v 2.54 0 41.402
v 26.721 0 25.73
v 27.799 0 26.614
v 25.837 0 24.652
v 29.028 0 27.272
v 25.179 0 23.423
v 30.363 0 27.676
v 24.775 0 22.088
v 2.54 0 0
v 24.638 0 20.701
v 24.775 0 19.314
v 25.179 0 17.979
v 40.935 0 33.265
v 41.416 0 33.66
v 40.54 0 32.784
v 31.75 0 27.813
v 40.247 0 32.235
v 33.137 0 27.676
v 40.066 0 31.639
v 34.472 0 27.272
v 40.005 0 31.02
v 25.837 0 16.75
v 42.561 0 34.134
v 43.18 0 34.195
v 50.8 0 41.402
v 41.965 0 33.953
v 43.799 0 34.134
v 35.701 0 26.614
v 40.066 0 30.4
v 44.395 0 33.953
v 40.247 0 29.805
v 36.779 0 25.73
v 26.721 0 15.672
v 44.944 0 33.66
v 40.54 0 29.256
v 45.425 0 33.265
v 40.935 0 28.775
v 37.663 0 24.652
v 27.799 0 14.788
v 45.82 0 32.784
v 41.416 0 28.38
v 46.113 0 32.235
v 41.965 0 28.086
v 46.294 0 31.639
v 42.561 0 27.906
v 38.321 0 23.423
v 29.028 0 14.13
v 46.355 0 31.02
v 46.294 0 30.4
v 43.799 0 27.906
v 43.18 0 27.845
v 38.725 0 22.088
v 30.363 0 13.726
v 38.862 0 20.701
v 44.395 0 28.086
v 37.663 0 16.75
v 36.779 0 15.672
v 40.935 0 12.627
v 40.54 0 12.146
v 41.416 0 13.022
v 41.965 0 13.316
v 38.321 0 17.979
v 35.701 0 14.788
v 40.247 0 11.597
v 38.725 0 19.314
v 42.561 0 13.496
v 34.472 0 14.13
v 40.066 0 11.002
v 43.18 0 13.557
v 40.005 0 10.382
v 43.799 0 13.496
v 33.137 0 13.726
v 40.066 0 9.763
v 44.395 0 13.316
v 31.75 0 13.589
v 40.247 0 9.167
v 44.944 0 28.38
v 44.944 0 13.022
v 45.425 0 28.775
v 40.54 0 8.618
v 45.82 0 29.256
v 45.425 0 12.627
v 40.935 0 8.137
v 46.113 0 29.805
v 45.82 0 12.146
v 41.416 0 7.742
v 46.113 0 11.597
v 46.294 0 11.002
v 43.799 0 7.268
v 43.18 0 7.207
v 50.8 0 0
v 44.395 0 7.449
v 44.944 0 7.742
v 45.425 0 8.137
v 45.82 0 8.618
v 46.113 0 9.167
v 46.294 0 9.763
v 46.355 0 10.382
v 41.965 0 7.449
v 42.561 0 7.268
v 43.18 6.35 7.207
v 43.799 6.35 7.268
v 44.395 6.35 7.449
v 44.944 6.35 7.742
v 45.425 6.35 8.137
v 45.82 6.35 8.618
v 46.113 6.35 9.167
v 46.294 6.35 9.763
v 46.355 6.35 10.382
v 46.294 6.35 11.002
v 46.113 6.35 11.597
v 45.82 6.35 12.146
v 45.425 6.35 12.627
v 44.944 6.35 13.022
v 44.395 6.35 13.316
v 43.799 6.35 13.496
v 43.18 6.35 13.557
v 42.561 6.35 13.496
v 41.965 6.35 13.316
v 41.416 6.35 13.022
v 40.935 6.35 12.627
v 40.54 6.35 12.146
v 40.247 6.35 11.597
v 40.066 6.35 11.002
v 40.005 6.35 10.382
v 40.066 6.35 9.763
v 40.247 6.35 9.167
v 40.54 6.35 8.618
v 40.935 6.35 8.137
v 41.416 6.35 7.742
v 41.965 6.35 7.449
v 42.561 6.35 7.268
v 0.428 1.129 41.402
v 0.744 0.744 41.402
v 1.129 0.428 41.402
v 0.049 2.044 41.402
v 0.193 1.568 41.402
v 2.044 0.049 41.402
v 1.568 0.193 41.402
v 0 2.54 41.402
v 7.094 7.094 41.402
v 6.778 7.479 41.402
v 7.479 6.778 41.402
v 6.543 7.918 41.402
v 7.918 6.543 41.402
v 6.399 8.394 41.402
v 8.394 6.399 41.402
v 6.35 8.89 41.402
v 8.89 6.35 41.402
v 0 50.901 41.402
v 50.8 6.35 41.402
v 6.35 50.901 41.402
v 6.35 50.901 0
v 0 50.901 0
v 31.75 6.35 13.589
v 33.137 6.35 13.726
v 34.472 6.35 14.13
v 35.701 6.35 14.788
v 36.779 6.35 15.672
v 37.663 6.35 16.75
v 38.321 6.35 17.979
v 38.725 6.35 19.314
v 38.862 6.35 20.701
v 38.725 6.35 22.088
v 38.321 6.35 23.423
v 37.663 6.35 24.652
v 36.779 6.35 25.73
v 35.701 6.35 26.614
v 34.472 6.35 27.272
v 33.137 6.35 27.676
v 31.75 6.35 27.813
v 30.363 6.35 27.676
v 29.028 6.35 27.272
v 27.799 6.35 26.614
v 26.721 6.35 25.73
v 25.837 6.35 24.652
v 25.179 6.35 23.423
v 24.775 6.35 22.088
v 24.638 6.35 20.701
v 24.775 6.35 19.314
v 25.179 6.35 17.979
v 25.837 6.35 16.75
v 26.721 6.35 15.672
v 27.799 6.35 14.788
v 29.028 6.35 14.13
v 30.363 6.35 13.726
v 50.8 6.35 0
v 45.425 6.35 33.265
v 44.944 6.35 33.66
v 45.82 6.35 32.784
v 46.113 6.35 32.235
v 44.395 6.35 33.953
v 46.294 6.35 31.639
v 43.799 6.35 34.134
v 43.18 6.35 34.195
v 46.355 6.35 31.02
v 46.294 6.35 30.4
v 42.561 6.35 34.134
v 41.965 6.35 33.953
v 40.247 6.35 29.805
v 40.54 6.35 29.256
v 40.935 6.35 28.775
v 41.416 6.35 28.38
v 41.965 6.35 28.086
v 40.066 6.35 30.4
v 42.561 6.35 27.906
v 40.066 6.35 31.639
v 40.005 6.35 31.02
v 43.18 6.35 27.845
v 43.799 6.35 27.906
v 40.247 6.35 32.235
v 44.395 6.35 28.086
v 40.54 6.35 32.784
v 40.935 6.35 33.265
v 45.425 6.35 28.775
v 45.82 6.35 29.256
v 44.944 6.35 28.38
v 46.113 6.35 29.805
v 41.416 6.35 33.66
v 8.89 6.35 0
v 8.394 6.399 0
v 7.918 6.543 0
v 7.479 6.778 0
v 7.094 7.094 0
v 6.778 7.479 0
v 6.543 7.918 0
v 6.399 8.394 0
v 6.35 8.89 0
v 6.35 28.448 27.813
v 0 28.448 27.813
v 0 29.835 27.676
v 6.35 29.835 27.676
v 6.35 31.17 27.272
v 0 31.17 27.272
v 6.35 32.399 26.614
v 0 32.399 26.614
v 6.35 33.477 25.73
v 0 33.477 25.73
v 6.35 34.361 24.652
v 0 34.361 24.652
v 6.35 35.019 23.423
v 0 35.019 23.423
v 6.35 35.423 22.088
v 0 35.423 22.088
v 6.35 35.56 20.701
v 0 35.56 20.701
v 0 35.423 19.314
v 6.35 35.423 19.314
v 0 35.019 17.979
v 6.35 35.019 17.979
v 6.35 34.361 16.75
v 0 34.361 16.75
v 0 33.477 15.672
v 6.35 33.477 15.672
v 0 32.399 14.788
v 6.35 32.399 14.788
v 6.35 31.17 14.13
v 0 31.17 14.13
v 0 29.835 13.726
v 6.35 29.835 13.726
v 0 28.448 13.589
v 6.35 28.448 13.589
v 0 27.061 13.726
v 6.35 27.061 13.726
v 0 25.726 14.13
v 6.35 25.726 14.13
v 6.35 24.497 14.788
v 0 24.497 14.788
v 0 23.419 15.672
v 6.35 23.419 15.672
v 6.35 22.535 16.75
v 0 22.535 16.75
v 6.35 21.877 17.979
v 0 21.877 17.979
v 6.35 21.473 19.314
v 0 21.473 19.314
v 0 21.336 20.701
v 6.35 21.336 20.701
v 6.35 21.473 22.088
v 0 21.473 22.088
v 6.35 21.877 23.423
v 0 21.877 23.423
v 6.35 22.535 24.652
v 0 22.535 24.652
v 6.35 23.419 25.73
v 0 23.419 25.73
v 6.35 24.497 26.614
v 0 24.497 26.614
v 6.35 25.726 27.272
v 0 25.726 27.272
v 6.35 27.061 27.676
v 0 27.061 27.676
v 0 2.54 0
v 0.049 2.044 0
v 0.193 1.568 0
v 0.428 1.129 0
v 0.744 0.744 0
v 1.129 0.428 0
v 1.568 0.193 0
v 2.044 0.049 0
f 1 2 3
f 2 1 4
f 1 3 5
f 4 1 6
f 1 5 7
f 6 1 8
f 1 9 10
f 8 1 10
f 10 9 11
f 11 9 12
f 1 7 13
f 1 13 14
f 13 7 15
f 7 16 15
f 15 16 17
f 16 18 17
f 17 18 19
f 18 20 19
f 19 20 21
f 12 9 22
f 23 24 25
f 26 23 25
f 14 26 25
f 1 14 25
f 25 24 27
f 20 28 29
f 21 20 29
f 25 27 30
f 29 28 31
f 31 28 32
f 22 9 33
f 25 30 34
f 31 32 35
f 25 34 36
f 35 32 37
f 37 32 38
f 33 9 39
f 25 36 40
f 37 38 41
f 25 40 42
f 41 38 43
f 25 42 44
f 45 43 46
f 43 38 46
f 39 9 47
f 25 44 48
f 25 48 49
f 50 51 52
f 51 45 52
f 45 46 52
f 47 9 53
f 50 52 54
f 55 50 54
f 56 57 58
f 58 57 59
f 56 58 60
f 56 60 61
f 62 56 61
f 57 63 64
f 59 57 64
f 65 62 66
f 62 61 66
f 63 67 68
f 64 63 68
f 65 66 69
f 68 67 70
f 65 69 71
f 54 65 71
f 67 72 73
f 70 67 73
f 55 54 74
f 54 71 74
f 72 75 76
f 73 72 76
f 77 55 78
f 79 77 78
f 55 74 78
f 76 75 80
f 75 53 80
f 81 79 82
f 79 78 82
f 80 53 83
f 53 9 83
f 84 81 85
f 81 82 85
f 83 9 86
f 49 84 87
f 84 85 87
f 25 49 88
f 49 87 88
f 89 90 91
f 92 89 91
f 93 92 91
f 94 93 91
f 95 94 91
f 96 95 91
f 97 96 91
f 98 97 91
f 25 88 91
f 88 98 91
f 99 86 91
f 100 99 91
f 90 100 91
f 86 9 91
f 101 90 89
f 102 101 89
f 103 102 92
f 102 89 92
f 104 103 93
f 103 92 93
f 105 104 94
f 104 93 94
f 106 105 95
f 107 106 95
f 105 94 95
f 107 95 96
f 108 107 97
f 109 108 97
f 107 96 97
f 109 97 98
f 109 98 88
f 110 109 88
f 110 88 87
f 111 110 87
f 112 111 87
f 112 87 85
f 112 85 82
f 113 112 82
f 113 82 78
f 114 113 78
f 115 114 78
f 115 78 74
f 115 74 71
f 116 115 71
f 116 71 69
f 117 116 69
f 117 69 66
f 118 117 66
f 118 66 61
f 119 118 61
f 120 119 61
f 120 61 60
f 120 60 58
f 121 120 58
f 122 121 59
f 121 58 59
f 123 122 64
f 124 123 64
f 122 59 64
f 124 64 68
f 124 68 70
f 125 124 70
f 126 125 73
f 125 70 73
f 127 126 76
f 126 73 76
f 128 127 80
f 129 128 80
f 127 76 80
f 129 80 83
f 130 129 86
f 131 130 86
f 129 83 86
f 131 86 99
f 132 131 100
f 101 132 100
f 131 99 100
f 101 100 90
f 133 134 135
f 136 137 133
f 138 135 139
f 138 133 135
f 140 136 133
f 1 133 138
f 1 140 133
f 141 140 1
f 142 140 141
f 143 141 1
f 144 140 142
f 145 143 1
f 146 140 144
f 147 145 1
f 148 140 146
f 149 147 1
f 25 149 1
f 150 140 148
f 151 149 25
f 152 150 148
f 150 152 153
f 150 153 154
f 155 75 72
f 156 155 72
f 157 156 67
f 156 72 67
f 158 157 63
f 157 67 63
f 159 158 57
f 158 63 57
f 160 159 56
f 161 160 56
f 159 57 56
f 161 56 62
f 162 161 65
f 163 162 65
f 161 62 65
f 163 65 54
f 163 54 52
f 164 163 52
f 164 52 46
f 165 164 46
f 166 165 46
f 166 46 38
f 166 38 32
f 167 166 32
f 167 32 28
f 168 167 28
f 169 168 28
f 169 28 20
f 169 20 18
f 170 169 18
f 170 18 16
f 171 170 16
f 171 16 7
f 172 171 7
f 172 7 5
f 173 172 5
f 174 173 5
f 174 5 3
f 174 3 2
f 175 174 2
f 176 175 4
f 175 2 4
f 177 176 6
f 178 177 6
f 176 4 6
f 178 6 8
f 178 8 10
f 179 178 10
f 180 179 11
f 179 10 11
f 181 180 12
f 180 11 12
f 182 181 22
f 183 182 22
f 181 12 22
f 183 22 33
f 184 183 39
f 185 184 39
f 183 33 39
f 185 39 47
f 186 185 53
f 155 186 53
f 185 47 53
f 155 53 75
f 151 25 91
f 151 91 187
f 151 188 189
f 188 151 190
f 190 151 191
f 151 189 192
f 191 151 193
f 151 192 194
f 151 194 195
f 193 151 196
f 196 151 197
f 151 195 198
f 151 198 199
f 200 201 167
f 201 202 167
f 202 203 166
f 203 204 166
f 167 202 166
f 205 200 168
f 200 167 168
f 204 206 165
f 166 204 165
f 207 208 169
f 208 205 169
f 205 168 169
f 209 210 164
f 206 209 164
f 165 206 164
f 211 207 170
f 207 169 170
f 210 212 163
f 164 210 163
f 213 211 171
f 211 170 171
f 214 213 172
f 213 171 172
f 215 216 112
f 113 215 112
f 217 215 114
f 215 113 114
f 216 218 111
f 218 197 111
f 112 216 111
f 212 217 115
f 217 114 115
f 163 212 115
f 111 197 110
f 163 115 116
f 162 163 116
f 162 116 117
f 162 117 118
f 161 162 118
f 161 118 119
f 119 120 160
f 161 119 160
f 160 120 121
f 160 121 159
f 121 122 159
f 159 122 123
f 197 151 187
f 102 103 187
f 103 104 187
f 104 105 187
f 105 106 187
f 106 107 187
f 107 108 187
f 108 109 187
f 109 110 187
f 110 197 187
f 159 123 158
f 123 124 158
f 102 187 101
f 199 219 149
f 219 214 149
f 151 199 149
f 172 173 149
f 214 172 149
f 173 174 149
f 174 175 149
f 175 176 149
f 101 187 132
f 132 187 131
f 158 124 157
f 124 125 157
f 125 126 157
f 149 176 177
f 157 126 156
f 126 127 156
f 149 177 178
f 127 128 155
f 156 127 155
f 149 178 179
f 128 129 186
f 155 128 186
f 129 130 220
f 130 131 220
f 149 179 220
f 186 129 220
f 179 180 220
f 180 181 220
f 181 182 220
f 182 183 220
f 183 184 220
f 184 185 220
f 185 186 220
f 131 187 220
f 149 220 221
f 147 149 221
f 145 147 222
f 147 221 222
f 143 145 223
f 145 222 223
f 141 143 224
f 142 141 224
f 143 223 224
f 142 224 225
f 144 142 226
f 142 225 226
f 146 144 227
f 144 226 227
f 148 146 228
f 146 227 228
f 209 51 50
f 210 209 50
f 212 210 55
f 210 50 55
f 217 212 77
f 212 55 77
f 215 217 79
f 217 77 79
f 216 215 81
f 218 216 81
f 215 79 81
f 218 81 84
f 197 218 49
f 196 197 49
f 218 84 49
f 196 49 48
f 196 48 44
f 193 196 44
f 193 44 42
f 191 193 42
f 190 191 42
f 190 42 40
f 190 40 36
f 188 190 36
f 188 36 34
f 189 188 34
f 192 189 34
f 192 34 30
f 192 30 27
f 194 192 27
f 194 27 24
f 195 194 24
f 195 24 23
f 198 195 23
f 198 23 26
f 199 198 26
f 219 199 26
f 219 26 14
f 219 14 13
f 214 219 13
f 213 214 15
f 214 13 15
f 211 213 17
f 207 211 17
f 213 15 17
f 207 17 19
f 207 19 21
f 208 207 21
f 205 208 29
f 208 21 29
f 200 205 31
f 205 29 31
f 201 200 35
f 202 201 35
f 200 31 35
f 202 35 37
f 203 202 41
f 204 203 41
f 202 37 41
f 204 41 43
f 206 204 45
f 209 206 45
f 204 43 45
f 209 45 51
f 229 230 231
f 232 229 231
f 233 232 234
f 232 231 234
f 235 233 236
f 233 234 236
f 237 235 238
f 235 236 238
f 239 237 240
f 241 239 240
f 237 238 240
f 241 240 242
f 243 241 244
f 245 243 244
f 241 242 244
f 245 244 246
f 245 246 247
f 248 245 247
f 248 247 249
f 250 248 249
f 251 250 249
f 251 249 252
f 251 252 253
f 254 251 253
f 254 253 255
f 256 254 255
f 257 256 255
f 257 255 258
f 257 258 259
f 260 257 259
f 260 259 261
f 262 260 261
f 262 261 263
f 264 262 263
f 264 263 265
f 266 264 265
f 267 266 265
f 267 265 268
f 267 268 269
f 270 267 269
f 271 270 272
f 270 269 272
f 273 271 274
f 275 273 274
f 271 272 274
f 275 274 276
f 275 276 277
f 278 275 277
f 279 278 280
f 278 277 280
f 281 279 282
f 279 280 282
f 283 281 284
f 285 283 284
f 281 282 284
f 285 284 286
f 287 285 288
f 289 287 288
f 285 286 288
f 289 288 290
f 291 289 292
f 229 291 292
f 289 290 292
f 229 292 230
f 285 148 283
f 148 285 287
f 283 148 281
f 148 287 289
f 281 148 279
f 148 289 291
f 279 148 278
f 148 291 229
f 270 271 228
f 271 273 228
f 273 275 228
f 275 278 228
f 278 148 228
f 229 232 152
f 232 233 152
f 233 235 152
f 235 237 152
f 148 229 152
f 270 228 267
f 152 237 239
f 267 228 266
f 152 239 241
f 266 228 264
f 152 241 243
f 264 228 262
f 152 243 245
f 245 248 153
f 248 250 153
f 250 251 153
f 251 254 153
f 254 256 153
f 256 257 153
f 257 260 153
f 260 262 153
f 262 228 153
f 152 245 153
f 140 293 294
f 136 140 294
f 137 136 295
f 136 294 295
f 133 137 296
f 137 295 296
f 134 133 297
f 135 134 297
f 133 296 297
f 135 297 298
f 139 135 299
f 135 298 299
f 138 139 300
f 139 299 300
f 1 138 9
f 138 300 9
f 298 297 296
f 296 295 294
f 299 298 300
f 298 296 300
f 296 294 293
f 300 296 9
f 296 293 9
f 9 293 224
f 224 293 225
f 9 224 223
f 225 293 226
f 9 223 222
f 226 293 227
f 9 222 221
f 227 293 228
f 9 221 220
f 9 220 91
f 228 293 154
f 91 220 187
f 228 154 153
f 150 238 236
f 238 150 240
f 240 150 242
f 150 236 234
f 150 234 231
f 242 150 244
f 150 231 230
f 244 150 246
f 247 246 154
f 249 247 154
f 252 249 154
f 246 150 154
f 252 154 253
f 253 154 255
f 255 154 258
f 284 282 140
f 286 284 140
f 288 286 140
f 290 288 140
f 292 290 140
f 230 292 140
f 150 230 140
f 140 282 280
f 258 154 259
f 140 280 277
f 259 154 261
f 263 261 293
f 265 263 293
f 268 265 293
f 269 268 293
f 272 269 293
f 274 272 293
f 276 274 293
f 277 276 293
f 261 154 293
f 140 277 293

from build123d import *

# Parameters (mm, degrees)
EXTRUDE_1_DEPTH     = 41.402
SKETCH_4_R          = 7.112
CUT_EXTRUDE_1_DEPTH = 83.979969858
SKETCH_3_R          = 7.112
CUT_EXTRUDE_2_DEPTH = 83.979969858
SKETCH1_R           = 3.175
CUT_EXTRUDE1_DEPTH  = 83.979969858


with BuildPart() as part:
    # 草图1 → 凸台-拉伸1 (new body)
    with BuildSketch(Plane.XY):
        with BuildLine():
            Line((2.54, 0), (50.8, 0))
            Line((50.8, 0), (50.8, 6.35))
            Line((50.8, 6.35), (8.89, 6.35))
            ThreePointArc((8.89, 6.35), (7.093948776, 7.093948776), (6.35, 8.89))
            Line((6.35, 8.89), (6.35, 50.900980282))
            Line((6.35, 50.900980282), (0, 50.900980282))
            Line((0, 50.900980282), (0, 2.54))
            ThreePointArc((0, 2.54), (0.743948776, 0.743948776), (2.54, 0))
        make_face()
    extrude(amount=EXTRUDE_1_DEPTH)

    # 草图4 → 切除-拉伸1 (cut, through all)
    with BuildSketch(Plane.ZY):
        with Locations((20.701, 28.448)):
            Circle(SKETCH_4_R)
    extrude(amount=-CUT_EXTRUDE_1_DEPTH, mode=Mode.SUBTRACT)

    # 草图3 → 切除-拉伸2 (cut, through all)
    with BuildSketch(Plane(origin=(0, 0, 0), x_dir=(-1, 0, 0), z_dir=(0, -1, 0))):
        with Locations(Location((-31.75, -20.701, 0), (0, 0, 90))):
            Circle(SKETCH_3_R)
    extrude(amount=-CUT_EXTRUDE_2_DEPTH, mode=Mode.SUBTRACT)

    # Sketch1 → Cut-Extrude1 (cut, through all)
    with BuildSketch(Plane(origin=(0, 0, 0), x_dir=(-1, 0, 0), z_dir=(0, -1, 0))):
        with Locations(Location((-43.18, -10.38225, 0), (0, 0, 90))):
            Circle(SKETCH1_R)
        with Locations(Location((-43.18, -31.01975, 0), (0, 0, 90))):
            Circle(SKETCH1_R)
    extrude(amount=-CUT_EXTRUDE1_DEPTH, mode=Mode.SUBTRACT)


solid = part.part
